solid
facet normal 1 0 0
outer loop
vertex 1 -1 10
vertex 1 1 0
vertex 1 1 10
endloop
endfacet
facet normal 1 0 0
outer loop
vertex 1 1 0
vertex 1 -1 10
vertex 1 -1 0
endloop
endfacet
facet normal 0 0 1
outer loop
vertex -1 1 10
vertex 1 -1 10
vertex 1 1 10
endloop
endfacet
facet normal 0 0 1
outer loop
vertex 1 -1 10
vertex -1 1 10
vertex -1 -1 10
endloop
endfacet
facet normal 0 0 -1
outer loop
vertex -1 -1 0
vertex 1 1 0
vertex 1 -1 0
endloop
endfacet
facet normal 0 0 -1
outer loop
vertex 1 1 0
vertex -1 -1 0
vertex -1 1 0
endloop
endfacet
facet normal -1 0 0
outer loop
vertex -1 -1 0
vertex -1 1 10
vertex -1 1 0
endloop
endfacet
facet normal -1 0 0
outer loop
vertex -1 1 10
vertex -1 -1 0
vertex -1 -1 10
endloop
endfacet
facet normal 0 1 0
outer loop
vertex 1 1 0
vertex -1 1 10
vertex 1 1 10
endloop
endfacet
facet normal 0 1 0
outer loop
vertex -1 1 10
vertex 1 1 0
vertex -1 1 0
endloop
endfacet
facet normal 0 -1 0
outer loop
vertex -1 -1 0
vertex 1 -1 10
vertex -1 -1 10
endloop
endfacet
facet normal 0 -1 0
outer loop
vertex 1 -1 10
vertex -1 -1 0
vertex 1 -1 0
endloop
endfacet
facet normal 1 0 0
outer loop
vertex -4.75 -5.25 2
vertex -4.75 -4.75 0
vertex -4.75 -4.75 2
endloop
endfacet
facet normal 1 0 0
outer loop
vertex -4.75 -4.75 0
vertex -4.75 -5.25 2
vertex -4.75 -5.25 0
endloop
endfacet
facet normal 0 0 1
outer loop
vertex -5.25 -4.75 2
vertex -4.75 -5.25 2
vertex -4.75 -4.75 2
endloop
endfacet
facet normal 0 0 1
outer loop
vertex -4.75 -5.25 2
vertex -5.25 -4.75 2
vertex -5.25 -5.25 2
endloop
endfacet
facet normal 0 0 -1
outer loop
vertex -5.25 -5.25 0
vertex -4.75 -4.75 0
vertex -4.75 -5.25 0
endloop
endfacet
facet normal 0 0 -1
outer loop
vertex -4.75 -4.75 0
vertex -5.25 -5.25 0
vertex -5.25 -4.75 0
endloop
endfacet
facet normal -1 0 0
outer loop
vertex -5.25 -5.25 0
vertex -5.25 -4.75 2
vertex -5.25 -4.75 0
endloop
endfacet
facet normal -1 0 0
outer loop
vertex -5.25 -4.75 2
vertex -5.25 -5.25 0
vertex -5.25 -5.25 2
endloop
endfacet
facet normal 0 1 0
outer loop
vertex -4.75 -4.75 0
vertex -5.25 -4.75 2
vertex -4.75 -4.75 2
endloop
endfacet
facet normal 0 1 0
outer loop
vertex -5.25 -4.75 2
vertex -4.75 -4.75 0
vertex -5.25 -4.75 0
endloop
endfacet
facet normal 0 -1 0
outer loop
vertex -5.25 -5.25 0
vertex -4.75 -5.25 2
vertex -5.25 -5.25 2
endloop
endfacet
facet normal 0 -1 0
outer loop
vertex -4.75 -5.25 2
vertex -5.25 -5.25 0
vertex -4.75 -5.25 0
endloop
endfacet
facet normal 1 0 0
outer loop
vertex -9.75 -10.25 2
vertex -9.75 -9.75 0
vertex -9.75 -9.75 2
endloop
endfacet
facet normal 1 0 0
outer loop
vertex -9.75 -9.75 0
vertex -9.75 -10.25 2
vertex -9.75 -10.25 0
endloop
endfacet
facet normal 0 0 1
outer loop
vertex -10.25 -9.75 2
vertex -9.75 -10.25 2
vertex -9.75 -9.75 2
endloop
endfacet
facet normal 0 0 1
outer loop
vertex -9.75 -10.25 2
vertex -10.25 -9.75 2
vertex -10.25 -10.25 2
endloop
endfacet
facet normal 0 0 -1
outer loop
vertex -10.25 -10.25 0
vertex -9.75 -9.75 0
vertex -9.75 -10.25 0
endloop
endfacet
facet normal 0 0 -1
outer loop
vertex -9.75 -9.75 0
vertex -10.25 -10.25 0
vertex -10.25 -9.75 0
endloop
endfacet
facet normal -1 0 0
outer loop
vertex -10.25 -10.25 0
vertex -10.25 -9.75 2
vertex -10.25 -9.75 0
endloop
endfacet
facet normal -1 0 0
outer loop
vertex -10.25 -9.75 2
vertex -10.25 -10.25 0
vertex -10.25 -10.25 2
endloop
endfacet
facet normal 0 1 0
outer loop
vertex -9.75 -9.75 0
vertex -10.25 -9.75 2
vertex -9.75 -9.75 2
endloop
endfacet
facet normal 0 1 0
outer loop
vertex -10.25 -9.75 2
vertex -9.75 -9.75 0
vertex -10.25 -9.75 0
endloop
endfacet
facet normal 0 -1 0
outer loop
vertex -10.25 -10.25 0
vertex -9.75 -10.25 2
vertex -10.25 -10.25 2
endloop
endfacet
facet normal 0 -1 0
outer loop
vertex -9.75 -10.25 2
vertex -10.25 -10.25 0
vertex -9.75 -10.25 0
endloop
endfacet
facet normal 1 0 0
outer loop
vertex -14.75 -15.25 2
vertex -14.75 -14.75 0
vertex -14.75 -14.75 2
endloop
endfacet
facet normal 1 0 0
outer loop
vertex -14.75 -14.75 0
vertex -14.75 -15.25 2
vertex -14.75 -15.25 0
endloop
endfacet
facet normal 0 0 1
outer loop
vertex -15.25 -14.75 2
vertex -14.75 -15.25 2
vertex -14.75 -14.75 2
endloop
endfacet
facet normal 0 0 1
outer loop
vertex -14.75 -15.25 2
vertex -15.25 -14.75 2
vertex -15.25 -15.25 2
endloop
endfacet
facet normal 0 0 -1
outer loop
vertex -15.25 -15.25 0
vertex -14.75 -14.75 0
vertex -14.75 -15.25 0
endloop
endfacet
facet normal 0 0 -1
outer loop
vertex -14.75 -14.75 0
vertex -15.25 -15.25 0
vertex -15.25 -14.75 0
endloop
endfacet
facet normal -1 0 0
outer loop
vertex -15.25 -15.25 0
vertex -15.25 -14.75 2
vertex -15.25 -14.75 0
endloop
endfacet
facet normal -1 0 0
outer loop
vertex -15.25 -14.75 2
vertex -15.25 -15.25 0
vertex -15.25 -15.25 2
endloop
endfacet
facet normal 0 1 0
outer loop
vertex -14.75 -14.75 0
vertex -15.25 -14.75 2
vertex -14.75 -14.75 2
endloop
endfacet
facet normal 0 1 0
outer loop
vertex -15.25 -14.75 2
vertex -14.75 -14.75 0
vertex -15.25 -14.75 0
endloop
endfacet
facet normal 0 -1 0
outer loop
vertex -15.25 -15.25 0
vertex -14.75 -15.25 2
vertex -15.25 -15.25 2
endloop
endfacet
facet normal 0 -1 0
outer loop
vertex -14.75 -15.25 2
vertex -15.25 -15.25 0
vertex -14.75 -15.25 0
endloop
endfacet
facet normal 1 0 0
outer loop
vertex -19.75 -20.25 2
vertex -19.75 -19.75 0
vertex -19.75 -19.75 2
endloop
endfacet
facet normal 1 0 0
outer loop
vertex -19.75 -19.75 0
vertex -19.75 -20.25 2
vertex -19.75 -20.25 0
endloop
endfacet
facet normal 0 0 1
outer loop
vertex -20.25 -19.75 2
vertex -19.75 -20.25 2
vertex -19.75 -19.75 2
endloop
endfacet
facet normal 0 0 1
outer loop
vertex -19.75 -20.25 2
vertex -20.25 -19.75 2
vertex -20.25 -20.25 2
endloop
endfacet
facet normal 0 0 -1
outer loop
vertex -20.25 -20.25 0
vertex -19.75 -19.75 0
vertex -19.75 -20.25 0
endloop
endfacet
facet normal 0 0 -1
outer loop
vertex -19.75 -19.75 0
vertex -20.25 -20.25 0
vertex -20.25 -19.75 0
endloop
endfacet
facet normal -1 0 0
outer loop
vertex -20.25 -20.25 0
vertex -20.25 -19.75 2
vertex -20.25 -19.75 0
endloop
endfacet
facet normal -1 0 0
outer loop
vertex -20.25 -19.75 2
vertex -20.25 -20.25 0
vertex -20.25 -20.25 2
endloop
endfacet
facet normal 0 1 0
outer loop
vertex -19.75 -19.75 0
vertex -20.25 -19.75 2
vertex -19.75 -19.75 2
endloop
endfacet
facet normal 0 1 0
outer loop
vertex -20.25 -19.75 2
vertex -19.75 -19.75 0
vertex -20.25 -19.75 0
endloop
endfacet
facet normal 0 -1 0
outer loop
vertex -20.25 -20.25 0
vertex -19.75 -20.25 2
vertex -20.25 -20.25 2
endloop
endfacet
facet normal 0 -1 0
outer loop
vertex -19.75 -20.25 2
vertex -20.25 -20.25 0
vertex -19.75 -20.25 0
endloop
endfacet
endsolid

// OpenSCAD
translate([0, 0, 5]) color([0,1,0,0.9]) cube([2, 2, 10], center=true);
translate([-5, -5, 1]) color([1,0,0]) cube([0.5, 0.5, 2], center=true);
translate([-10, -10, 1]) color([1,0,0]) cube([0.5, 0.5, 2], center=true);
translate([-15, -15, 1]) color([1,0,0]) cube([0.5, 0.5, 2], center=true);
translate([-20, -20, 1]) color([1,0,0]) cube([0.5, 0.5, 2], center=true);
